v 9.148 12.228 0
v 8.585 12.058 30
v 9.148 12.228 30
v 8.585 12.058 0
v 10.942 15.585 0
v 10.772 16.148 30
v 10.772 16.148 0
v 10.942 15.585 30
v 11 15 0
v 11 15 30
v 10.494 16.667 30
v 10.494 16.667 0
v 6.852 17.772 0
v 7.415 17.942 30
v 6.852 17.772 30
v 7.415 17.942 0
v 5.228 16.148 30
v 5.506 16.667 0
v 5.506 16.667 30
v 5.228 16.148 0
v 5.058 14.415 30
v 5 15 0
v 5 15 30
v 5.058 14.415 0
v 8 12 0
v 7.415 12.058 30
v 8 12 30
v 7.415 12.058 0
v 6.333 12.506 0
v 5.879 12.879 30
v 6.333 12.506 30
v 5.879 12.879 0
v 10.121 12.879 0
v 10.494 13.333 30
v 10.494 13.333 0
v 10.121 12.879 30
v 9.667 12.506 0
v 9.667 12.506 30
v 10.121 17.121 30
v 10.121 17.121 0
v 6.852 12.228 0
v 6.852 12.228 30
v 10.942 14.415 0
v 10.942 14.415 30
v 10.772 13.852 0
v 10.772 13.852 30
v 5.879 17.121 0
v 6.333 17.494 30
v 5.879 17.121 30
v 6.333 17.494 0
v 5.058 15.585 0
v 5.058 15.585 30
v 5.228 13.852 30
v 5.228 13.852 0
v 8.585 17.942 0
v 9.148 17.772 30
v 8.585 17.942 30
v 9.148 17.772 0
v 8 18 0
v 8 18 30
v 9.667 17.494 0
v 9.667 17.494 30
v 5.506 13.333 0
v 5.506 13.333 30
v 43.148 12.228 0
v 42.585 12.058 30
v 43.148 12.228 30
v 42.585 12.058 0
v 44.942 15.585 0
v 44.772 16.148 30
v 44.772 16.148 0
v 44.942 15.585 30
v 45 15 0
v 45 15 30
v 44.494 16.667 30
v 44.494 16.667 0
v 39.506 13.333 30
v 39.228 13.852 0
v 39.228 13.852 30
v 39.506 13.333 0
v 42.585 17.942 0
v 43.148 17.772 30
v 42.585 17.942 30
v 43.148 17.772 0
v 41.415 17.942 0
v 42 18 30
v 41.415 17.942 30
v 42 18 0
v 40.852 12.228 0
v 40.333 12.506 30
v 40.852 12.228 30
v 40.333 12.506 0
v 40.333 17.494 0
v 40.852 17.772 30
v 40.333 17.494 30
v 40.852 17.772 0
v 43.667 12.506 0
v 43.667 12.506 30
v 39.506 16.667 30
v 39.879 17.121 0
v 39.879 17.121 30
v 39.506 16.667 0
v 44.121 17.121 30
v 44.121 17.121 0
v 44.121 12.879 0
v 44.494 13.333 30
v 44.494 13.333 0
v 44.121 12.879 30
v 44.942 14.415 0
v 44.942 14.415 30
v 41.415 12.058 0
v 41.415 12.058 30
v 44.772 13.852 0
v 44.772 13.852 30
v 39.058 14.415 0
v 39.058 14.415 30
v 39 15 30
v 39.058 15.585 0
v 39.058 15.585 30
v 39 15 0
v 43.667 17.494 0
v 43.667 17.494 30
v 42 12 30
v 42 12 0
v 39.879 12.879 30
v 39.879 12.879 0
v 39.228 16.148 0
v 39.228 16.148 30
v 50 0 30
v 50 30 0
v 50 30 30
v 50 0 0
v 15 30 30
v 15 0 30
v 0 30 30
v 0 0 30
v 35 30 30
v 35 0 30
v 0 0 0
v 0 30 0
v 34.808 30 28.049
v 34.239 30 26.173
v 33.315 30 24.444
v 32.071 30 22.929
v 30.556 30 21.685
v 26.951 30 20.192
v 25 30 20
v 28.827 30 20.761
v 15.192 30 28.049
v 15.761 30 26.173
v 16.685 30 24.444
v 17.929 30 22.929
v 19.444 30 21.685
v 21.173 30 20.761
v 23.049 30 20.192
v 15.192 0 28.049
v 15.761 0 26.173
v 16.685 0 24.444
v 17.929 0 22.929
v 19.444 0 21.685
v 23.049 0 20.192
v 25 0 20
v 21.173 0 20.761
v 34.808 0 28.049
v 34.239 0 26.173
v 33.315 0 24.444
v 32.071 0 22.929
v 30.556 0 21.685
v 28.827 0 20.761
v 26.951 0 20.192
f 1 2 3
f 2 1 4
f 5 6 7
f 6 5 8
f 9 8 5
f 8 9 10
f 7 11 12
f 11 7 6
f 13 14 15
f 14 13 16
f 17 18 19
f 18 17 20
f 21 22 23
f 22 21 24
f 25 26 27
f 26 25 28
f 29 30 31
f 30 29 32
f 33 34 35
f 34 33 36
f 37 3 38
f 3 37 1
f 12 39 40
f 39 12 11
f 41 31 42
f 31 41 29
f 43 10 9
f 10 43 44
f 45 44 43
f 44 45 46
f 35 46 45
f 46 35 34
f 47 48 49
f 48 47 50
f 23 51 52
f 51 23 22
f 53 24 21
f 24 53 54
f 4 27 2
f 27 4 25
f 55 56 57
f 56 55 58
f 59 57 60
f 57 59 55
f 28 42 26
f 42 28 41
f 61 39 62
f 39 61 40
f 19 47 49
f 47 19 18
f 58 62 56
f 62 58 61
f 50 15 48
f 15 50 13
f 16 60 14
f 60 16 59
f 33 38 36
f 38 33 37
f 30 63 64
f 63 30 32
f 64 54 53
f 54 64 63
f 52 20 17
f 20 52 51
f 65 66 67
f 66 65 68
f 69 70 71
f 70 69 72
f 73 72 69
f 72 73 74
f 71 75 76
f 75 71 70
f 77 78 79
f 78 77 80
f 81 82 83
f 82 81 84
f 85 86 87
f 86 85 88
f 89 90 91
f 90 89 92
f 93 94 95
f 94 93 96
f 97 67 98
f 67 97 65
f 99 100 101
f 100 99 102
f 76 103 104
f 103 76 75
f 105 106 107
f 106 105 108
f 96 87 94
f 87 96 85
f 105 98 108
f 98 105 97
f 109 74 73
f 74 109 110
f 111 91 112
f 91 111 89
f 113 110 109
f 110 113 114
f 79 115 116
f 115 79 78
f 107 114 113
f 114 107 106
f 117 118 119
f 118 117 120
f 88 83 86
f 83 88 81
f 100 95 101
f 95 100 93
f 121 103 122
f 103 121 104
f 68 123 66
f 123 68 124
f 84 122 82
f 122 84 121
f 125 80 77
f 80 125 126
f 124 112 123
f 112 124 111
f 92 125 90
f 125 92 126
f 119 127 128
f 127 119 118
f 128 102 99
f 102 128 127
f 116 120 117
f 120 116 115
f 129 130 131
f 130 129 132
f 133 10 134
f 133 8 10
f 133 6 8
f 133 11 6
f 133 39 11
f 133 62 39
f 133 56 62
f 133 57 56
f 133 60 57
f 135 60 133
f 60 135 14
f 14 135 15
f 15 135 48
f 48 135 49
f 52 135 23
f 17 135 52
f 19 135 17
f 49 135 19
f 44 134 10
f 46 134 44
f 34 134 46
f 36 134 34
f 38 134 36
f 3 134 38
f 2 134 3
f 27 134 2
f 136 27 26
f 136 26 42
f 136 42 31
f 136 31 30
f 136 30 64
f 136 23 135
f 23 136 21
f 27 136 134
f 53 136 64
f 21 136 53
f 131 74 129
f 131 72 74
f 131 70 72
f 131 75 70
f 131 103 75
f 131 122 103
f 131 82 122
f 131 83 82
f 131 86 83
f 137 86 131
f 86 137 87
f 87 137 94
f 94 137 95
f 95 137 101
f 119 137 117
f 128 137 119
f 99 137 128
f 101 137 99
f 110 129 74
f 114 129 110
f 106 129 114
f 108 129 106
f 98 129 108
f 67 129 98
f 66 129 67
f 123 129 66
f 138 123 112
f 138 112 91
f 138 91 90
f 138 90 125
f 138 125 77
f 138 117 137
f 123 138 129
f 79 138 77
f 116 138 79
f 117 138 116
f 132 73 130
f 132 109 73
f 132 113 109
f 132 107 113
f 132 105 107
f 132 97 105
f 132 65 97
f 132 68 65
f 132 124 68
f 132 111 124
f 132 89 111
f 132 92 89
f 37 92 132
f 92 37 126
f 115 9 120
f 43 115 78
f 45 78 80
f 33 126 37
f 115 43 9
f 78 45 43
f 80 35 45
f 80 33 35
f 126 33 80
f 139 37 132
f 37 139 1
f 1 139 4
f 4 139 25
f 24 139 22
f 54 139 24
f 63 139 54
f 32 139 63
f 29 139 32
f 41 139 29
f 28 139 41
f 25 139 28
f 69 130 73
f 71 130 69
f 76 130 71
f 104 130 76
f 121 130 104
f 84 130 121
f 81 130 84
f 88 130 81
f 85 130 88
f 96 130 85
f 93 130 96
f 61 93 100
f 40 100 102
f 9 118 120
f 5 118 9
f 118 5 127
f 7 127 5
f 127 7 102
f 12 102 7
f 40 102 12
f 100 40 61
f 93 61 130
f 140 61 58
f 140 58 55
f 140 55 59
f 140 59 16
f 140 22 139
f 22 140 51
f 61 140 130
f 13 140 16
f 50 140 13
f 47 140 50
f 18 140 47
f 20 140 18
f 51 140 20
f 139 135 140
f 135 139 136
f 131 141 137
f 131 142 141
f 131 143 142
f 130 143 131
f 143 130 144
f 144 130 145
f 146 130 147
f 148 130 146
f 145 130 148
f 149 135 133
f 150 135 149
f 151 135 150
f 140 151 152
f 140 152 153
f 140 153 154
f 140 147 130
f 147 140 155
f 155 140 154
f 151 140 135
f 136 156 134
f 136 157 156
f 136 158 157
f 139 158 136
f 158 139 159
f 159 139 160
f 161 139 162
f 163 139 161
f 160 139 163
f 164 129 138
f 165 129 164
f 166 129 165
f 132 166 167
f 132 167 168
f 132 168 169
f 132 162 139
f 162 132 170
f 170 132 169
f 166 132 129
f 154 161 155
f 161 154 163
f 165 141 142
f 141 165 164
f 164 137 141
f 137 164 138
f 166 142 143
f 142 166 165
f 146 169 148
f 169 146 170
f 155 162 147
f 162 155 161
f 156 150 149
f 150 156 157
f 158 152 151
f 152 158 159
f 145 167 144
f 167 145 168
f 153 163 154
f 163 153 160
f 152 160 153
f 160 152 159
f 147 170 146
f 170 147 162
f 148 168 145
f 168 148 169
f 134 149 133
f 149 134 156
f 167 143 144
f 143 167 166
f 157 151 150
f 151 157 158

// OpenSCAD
$fn = 32;

// ----------------------------------------------------------------------
// Saddle clamp: plain shaft clamp
// ----------------------------------------------------------------------

// --- parameters (mm) ---
blk_l = 50;               // block length, X
blk_w = 30;               // block width, Y
blk_h = 30;               // block height
clamp_r = 10;             // shaft groove radius
hole_r = 3;               // bolt hole radius
hole_m = 8;               // bolt hole margin from the ends

saw_depth = clamp_r + 3;  // saw kerf depth

difference() {
  cube([blk_l, blk_w, blk_h]);
  translate([blk_l / 2, -1, blk_h])
    rotate([-90, 0, 0])
      cylinder(h = blk_w + 2, r = clamp_r);
  for (sx = [0, 1])
    translate([sx ? blk_l - hole_m : hole_m, blk_w / 2, -1])
      cylinder(r = hole_r, h = blk_h + 2);
}
